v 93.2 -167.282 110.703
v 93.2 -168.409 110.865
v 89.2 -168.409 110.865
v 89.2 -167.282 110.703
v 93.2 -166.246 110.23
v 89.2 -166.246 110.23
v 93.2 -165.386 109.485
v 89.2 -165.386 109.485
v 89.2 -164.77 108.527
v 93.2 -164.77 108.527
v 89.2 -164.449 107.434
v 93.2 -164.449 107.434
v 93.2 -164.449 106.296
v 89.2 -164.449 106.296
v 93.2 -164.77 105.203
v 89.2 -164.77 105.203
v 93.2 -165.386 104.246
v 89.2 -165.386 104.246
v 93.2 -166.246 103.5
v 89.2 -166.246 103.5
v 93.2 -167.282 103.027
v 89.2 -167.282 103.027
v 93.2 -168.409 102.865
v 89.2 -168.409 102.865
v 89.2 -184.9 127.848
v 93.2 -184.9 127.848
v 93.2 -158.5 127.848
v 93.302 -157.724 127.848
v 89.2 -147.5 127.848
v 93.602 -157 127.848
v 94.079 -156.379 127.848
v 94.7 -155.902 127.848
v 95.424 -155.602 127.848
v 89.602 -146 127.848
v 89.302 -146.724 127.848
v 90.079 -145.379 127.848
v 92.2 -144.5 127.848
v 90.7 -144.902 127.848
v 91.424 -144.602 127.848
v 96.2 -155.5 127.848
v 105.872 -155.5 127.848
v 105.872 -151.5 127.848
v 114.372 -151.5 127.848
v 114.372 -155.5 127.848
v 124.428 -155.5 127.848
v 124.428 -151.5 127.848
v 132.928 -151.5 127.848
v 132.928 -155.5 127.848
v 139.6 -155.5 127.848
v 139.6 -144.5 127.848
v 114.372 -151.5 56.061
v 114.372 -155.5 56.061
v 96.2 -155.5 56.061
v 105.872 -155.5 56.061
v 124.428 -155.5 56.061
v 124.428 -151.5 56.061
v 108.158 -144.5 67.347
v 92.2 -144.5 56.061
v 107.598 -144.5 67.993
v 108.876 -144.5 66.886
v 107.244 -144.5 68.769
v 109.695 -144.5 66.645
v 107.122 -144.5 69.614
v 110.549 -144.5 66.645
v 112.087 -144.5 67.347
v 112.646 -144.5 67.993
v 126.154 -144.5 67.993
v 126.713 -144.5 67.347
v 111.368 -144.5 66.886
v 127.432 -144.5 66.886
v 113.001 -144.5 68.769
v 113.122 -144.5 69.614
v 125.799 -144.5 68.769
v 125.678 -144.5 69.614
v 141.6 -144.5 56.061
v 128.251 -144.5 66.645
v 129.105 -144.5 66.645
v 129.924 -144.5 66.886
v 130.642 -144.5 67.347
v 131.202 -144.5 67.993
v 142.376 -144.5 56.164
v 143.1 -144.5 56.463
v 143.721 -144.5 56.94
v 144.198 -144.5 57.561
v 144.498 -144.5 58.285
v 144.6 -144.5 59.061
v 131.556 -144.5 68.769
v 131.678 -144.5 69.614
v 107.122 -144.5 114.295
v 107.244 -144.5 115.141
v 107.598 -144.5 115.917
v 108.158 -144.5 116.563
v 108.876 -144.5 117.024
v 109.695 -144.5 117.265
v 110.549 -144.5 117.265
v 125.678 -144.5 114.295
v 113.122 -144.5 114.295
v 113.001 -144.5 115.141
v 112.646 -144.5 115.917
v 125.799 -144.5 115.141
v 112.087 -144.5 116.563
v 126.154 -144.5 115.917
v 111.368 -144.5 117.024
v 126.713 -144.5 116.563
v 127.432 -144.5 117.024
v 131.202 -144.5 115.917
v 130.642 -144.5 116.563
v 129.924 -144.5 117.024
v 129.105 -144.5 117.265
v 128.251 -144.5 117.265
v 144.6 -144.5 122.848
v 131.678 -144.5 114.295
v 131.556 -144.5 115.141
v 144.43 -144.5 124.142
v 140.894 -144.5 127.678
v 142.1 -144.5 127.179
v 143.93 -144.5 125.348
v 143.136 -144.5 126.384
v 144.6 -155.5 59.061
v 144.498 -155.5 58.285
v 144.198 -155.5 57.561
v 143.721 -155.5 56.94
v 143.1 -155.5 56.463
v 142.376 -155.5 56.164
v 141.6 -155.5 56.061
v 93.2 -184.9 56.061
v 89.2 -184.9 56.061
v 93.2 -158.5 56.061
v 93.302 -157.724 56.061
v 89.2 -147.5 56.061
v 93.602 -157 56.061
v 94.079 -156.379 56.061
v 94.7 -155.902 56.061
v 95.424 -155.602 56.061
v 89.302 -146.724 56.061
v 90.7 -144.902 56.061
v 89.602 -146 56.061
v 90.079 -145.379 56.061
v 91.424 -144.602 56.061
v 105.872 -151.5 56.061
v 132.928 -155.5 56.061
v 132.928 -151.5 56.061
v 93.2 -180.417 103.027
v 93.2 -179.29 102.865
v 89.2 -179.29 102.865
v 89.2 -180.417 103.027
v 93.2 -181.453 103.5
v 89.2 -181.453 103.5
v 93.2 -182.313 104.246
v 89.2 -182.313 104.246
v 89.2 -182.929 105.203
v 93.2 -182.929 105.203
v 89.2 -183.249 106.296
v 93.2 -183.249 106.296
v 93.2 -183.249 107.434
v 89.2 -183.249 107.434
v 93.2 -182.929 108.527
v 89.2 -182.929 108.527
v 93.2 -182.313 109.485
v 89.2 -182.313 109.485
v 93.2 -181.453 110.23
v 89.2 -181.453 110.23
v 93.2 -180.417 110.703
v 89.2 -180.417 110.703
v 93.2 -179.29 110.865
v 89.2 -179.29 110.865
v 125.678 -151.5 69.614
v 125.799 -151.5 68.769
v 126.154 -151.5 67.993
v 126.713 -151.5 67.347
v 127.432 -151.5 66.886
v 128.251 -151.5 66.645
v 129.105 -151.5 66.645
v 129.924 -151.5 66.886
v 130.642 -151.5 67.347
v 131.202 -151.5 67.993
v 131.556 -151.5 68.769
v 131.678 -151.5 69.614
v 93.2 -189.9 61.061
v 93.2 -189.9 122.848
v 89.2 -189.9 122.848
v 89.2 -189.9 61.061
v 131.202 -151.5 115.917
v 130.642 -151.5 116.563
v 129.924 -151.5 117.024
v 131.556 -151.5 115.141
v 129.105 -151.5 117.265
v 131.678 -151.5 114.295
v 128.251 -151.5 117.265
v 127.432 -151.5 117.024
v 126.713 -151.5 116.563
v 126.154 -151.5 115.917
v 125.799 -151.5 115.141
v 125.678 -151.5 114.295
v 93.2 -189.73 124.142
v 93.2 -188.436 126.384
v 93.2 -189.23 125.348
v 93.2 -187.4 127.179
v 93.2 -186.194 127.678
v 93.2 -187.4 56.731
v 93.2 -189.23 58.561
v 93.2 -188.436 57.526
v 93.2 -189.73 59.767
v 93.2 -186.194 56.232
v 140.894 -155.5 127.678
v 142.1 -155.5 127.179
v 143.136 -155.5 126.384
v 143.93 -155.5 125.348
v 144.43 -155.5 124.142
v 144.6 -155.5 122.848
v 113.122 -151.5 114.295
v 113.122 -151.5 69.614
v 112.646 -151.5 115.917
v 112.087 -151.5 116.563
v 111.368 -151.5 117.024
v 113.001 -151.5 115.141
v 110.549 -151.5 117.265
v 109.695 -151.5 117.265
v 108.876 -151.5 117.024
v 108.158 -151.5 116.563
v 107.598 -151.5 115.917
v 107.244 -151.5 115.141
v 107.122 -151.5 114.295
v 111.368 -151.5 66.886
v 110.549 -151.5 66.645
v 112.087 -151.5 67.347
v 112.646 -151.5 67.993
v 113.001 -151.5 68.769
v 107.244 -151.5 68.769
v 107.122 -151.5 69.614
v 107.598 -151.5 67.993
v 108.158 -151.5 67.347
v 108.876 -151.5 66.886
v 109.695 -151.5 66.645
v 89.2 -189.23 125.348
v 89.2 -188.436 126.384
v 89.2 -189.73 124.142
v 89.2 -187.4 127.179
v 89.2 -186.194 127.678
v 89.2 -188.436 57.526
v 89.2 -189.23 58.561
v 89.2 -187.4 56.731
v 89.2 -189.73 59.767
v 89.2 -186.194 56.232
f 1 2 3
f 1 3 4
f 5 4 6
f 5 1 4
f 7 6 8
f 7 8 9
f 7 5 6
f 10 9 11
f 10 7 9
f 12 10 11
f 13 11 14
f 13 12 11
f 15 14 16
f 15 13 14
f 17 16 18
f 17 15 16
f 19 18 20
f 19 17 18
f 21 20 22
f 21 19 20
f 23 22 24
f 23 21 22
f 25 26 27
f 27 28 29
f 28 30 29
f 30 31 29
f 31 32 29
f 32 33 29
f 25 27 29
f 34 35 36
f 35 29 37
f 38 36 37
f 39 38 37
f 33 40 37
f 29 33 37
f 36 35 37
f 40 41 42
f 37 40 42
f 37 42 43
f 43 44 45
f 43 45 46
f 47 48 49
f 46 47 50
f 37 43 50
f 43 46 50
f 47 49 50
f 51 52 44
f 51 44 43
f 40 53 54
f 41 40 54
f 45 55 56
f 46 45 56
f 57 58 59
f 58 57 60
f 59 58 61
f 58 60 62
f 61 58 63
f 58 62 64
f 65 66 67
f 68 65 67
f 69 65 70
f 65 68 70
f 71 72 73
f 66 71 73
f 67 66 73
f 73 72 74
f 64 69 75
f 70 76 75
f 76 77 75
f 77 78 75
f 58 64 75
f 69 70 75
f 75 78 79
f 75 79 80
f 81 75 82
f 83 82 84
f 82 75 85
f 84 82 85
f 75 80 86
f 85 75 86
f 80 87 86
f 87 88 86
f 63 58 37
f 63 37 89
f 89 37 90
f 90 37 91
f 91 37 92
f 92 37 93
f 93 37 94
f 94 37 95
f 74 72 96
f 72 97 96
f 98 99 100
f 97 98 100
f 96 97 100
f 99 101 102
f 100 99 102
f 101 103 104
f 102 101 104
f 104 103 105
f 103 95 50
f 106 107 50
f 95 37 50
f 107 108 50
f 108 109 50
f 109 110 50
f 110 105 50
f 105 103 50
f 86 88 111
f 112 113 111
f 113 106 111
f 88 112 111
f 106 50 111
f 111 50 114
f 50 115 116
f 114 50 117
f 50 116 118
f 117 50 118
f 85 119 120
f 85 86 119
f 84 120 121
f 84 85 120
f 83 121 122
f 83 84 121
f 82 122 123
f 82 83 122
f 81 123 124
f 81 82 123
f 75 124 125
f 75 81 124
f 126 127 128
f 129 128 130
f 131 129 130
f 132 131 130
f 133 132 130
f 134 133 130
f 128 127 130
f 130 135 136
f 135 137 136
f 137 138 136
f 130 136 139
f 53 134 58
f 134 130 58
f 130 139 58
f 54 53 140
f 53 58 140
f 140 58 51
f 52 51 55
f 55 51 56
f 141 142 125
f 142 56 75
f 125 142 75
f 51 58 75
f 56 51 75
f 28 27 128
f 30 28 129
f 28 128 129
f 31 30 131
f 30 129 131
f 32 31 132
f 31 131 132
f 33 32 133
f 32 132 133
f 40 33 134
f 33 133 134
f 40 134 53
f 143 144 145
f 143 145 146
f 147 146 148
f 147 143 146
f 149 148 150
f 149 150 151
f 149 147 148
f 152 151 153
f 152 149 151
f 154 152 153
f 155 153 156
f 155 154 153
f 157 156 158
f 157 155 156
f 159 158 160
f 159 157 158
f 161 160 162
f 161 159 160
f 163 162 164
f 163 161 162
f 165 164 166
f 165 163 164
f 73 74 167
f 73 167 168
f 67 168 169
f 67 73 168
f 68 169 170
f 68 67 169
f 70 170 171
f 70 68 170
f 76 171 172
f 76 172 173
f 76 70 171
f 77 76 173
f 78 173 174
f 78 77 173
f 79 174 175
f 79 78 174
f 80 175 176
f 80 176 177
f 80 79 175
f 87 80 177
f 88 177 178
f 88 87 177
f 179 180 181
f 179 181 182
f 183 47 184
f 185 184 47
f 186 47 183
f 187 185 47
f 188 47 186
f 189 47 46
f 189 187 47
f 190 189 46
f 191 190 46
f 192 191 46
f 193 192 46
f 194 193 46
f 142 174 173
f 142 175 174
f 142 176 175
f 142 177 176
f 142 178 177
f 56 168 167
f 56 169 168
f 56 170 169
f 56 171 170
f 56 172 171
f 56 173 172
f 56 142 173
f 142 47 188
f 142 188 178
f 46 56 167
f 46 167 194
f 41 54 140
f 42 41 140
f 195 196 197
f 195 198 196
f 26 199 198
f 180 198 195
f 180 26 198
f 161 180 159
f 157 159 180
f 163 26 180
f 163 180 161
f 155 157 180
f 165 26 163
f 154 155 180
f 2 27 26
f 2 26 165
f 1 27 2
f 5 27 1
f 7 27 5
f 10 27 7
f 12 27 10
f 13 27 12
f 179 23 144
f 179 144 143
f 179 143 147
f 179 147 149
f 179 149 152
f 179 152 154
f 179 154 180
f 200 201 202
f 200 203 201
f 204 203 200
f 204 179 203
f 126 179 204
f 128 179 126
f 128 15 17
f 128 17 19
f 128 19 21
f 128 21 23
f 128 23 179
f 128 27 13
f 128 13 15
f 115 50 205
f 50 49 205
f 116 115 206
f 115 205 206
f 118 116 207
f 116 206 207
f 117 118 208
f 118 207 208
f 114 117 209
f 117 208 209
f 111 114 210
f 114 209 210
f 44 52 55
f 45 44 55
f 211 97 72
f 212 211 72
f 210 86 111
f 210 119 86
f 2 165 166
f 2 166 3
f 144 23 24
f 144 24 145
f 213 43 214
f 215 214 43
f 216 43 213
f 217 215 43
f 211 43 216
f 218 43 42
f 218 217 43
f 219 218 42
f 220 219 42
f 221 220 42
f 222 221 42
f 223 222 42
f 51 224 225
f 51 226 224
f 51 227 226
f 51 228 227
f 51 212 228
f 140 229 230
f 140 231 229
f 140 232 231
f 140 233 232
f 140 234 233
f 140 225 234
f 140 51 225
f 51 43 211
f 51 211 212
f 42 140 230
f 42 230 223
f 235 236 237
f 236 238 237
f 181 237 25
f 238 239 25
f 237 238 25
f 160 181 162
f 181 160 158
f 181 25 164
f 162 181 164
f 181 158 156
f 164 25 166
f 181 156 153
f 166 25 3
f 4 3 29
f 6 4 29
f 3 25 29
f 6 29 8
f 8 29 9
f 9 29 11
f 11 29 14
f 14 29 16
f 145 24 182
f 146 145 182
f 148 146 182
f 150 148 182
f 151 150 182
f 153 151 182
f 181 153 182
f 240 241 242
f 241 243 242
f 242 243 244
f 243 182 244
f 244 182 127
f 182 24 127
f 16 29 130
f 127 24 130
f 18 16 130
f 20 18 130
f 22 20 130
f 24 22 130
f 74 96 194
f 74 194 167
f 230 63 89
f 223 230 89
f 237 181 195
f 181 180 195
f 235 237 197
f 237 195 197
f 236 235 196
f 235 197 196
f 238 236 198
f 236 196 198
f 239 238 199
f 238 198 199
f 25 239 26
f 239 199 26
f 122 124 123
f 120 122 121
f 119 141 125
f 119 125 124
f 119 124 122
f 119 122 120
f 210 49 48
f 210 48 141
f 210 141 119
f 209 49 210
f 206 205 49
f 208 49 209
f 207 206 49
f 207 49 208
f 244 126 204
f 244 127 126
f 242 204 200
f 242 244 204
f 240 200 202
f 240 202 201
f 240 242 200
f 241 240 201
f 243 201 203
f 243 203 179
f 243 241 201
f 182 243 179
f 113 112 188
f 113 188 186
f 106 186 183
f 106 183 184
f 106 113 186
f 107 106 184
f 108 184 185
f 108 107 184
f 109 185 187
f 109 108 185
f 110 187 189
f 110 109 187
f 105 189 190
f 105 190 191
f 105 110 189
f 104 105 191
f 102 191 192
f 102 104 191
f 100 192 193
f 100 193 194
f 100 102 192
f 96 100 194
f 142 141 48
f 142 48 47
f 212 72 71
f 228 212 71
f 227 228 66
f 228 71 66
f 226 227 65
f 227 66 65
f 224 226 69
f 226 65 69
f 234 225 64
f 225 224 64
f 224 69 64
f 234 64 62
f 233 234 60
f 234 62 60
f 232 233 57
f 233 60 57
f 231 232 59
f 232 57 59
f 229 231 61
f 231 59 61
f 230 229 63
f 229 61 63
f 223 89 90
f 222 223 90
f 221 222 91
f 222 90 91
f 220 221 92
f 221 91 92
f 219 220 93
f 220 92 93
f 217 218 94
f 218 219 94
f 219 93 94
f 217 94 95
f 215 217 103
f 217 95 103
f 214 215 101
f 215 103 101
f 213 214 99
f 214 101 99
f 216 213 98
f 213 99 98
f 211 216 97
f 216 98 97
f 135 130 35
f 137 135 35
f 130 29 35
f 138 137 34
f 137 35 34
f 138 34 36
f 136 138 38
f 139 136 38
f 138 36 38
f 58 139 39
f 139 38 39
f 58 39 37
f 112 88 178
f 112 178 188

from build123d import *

# Parameters (mm, degrees)
BOSS_EXTRUDE1_START             = 0.2
SKETCH2_W                       = 41.966567091
SKETCH2_H                       = 11
SKETCH2_H_2                     = 34.4
SKETCH2_R                       = 4
SKETCH2_H_3                     = 4
BOSS_EXTRUDE1_DEPTH             = 4
BOSS_EXTRUDE2_REACH             = 197.713
SKETCH2_3_W                     = 41.966567091
SKETCH2_3_H                     = 11
SKETCH2_3_H_2                   = 4
BOSS_EXTRUDE2_DIRECTION_2_DEPTH = 60.2
FILLET1_R                       = 3
SKETCH3_W                       = 9
SKETCH3_H                       = 11.2
CUT_EXTRUDE1_DEPTH              = 24.029037182
SKETCH4_W                       = 71.659193782
SKETCH4_H                       = 19.690367256
SKETCH4_R                       = 3.18615952
BOSS_EXTRUDE3_DEPTH             = 4
FILLET2_R                       = 3
BOSS_EXTRUDE4_START             = -11
SKETCH5_W                       = 55.4
SKETCH5_H                       = 29.820392461
BOSS_EXTRUDE4_DEPTH             = 11
FILLET3_R                       = 3
CUT_EXTRUDE2_DEPTH              = 258.572392856
CUT_EXTRUDE2_DEPTH_BACK         = 258.572392856
SKETCH7_W                       = 8.5
SKETCH7_H                       = 4
FILLET6_R                       = 2
CUT_EXTRUDE3_REACH              = 172.81
CUT_EXTRUDE4_DEPTH              = 174.523300181
CUT_EXTRUDE4_DEPTH_BACK         = 174.523300181
FILLET7_R                       = 5
BOSS_EXTRUDE5_START             = -4
SKETCH10_W                      = 29.820392461
SKETCH10_H                      = 34.4
BOSS_EXTRUDE5_DEPTH             = 4
BOSS_EXTRUDE6_START             = 29.82039246
BOSS_EXTRUDE6_DEPTH             = 29.82039246
CUT_EXTRUDE5_DEPTH              = 210.306605099
CUT_EXTRUDE5_DEPTH_BACK         = 210.306605099
CUT_EXTRUDE6_DEPTH              = 210.306605099
CUT_EXTRUDE6_DEPTH_BACK         = 210.306605099
SKETCH15_W                      = 78.727492145
SKETCH15_H                      = 13.85710387
CUT_EXTRUDE8_REACH              = 163.596
SKETCH16_W                      = 13.433327452
SKETCH16_H                      = 52.832089958
FILLET8_R                       = 5


with BuildPart() as part:
    # Sketch2 → Boss-Extrude1 (new body)
    # profile 1 of 3: a face of its own
    with BuildSketch(Plane.ZY.offset(-93.4).offset(BOSS_EXTRUDE1_START)):
        with Locations((5.257762951, -150)):
            Rectangle(SKETCH2_W, SKETCH2_H)
    # profile 2 of 3: a face of its own
    with BuildSketch(Plane.ZY.offset(-93.4).offset(BOSS_EXTRUDE1_START)):
        with Locations((5.257762951, -172.7)):
            Rectangle(SKETCH2_W, SKETCH2_H_2)
        with Locations((5.257762951, -173.849326746)):
            Circle(SKETCH2_R, mode=Mode.SUBTRACT)
    # profile 3 of 3: a face of its own
    with BuildSketch(Plane.ZY.offset(-93.4).offset(BOSS_EXTRUDE1_START)):
        with Locations((5.257762951, -191.9)):
            Rectangle(SKETCH2_W, SKETCH2_H_3)
    extrude(amount=BOSS_EXTRUDE1_DEPTH)

    # Sketch2<3> → Boss-Extrude2 (add, up to next)
    with BuildSketch(Plane.ZY.offset(-93.4), mode=Mode.PRIVATE) as boss_extrude2_sk1:
        with Locations((5.257762951, -150)):
            Rectangle(SKETCH2_3_W, SKETCH2_3_H)
    boss_extrude2_tool1 = extrude(boss_extrude2_sk1.sketch, amount=BOSS_EXTRUDE2_REACH, mode=Mode.PRIVATE) - part.part
    # Sketch2<3> → Boss-Extrude2 (add, up to next)
    with BuildSketch(Plane.ZY.offset(-93.4), mode=Mode.PRIVATE) as boss_extrude2_sk2:
        with Locations((5.257762951, -191.9)):
            Rectangle(SKETCH2_3_W, SKETCH2_3_H_2)
    boss_extrude2_tool2 = extrude(boss_extrude2_sk2.sketch, amount=BOSS_EXTRUDE2_REACH, mode=Mode.PRIVATE) - part.part
    add(boss_extrude2_tool1.solids().sort_by_distance((93.4, -150, 5.257763))[0])
    add(boss_extrude2_tool2.solids().sort_by_distance((93.4, -191.9, 5.257763))[0])

    # Sketch2<3> → Boss-Extrude2 direction 2 (add)
    with BuildSketch(Plane.ZY.offset(-93.4)):
        with Locations((5.257762951, -150)):
            Rectangle(SKETCH2_3_W, SKETCH2_3_H)
        with Locations((5.257762951, -191.9)):
            Rectangle(SKETCH2_3_W, SKETCH2_3_H_2)
    extrude(amount=-BOSS_EXTRUDE2_DIRECTION_2_DEPTH)

    # Fillet1
    fillet1_edges = [part.edges().sort_by_distance(p)[0] for p in [
        (89.2, -193.9, 5.257762951),
        (93.2, -155.5, 5.257762951),
        (153.6, -191.9, 26.241046496),
        (93.2, -189.9, 5.257762951),
        (153.6, -191.9, -15.725520595),
    ]]
    fillet(fillet1_edges, radius=FILLET1_R)

    # Sketch3 → Cut-Extrude1 (cut)
    with BuildSketch(Plane.XY.offset(26.241046496)):
        with Locations((149.1, -150.1)):
            Rectangle(SKETCH3_W, SKETCH3_H)
    extrude(amount=-CUT_EXTRUDE1_DEPTH, mode=Mode.SUBTRACT)

    # Sketch4 → Boss-Extrude3 (add)
    with BuildSketch(Plane(origin=(153.6, 0, 0), x_dir=(0, 0, -1), z_dir=(1, 0, 0))):
        with Locations((-20.104076296, -145.654816372)):
            Rectangle(SKETCH4_W, SKETCH4_H)
        with Locations((-39.297424086, -145.700936153)):
            Circle(SKETCH4_R, mode=Mode.SUBTRACT)
        with Locations((-9.68615952, -145.700936153)):
            Circle(SKETCH4_R, mode=Mode.SUBTRACT)
    extrude(amount=-BOSS_EXTRUDE3_DEPTH)

    # Fillet2
    fillet2_edges = [part.edges().sort_by_distance(p)[0] for p in [
        (149.6, -144.5, -6.75675564),
        (151.6, -135.809632744, -15.725520595),
        (151.6, -135.809632744, 55.933673187),
    ]]
    fillet(fillet2_edges, radius=FILLET2_R)

    # Sketch5 → Boss-Extrude4 (add)
    with BuildSketch(Plane(origin=(0, -144.5, 0), x_dir=(1, 0, 0), z_dir=(0, 1, 0)).offset(BOSS_EXTRUDE4_START)):
        with Locations((116.9, -41.151242727)):
            Rectangle(SKETCH5_W, SKETCH5_H)
    extrude(amount=BOSS_EXTRUDE4_DEPTH)

    # Fillet3
    fillet3_edges = [part.edges().sort_by_distance(p)[0] for p in [
        (144.6, -150, 56.061438957),
        (89.2, -144.5, 20.167959181),
    ]]
    fillet(fillet3_edges, radius=FILLET3_R)

    # Sketch7 → Cut-Extrude2 (cut, two sides: drawn at the far end of the back side and taken through both)
    with BuildSketch(Plane(origin=(0, 0, -15.725520595), x_dir=(-1, 0, 0), z_dir=(0, 0, -1)).offset(-CUT_EXTRUDE2_DEPTH_BACK)):
        with Locations((-128.677790471, -153.5)):
            Rectangle(SKETCH7_W, SKETCH7_H)
        with Locations((-110.122209529, -153.5)):
            Rectangle(SKETCH7_W, SKETCH7_H)
    extrude(amount=CUT_EXTRUDE2_DEPTH + CUT_EXTRUDE2_DEPTH_BACK, mode=Mode.SUBTRACT)

    # Fillet6
    fillet6_edges = [part.edges().sort_by_distance(p)[0] for p in [
        (144.6, -150, 2.212009314),
    ]]
    fillet(fillet6_edges, radius=FILLET6_R)

    # Sketch8 → Cut-Extrude3 (cut, up to next)
    with BuildSketch(Plane(origin=(0, -144.5, 0), x_dir=(1, 0, 0), z_dir=(0, 1, 0)), mode=Mode.PRIVATE) as cut_extrude3_sk1:
        with BuildLine():
            Line((113.122209529, 2.172515143), (113.122209529, -42.508433505))
            ThreePointArc((113.122209529, -42.508433505), (110.122209529, -45.508433505), (107.122209529, -42.508433505))
            Line((107.122209529, -42.508433505), (107.122209529, 2.172515143))
            ThreePointArc((107.122209529, 2.172515143), (110.122209529, 5.172515143), (113.122209529, 2.172515143))
        make_face()
    cut_extrude3_tool1 = extrude(cut_extrude3_sk1.sketch, amount=-CUT_EXTRUDE3_REACH, mode=Mode.PRIVATE) & part.part
    # Sketch8 → Cut-Extrude3 (cut, up to next)
    with BuildSketch(Plane(origin=(0, -144.5, 0), x_dir=(1, 0, 0), z_dir=(0, 1, 0)), mode=Mode.PRIVATE) as cut_extrude3_sk2:
        with BuildLine():
            Line((125.677790471, 2.172515143), (125.677790471, -42.508433505))
            ThreePointArc((125.677790471, -42.508433505), (128.677790471, -45.508433505), (131.677790471, -42.508433505))
            Line((131.677790471, -42.508433505), (131.677790471, 2.172515143))
            ThreePointArc((131.677790471, 2.172515143), (128.677790471, 5.172515143), (125.677790471, 2.172515143))
        make_face()
    cut_extrude3_tool2 = extrude(cut_extrude3_sk2.sketch, amount=-CUT_EXTRUDE3_REACH, mode=Mode.PRIVATE) & part.part
    add(cut_extrude3_tool1.solids().sort_by_distance((110.12221, -144.5, 20.167959))[0], mode=Mode.SUBTRACT)
    add(cut_extrude3_tool2.solids().sort_by_distance((128.67779, -144.5, 20.167959))[0], mode=Mode.SUBTRACT)

    # Sketch9 → Cut-Extrude4 (cut, two sides: drawn at the far end of the back side and taken through both)
    with BuildSketch(Plane(origin=(0, -135.809632744, 0), x_dir=(1, 0, 0), z_dir=(0, 1, 0)).offset(-CUT_EXTRUDE4_DEPTH_BACK)):
        Polygon((144.6, 47.11572478), (144.6, -77.58184164), (185.54461202, -56.674351197), (190.182137353, 46.607841752), align=None)
    extrude(amount=CUT_EXTRUDE4_DEPTH + CUT_EXTRUDE4_DEPTH_BACK, mode=Mode.SUBTRACT)

    # Fillet7
    fillet7_edges = [part.edges().sort_by_distance(p)[0] for p in [
        (144.6, -150, -15.725520595),
    ]]
    fillet(fillet7_edges, radius=FILLET7_R)

    # Sketch10 → Boss-Extrude5 (add)
    with BuildSketch(Plane.ZY.offset(-89.2).offset(BOSS_EXTRUDE5_START)):
        with Locations((41.151242727, -172.7)):
            Rectangle(SKETCH10_W, SKETCH10_H)
    extrude(amount=BOSS_EXTRUDE5_DEPTH)

    # Sketch11 → Boss-Extrude6 (add)
    with BuildSketch(Plane.XY.offset(26.241046496).offset(BOSS_EXTRUDE6_START)):
        with BuildLine():
            Line((93.2, -155.5), (93.2, -158.5))
            ThreePointArc((93.2, -158.5), (94.078679656, -156.378679656), (96.2, -155.5))
            Line((96.2, -155.5), (93.2, -155.5))
        make_face()
    extrude(amount=-BOSS_EXTRUDE6_DEPTH)

    # Sketch14 → Cut-Extrude5 (cut, two sides: drawn at the far end of the back side and taken through both)
    with BuildSketch(Plane.ZY.offset(-89.2).offset(-CUT_EXTRUDE5_DEPTH_BACK)):
        with BuildLine():
            Line((9.257762951, -168.408548592), (9.257762951, -179.290104899))
            ThreePointArc((9.257762951, -179.290104899), (5.257762951, -183.290104899), (1.257762951, -179.290104899))
            Line((1.257762951, -179.290104899), (1.257762951, -168.408548592))
            ThreePointArc((1.257762951, -168.408548592), (5.257762951, -164.408548592), (9.257762951, -168.408548592))
        make_face()
    extrude(amount=CUT_EXTRUDE5_DEPTH + CUT_EXTRUDE5_DEPTH_BACK, mode=Mode.SUBTRACT)

    # Sketch15 → Cut-Extrude6 (cut, two sides: drawn at the far end of the back side and taken through both)
    with BuildSketch(Plane.ZY.offset(-89.2).offset(-CUT_EXTRUDE6_DEPTH_BACK)):
        with Locations((22.135388596, -196.828551935)):
            Rectangle(SKETCH15_W, SKETCH15_H)
    extrude(amount=CUT_EXTRUDE6_DEPTH + CUT_EXTRUDE6_DEPTH_BACK, mode=Mode.SUBTRACT)

    # Sketch16 → Cut-Extrude8 (cut, up to next)
    with BuildSketch(Plane.XZ.offset(189.9), mode=Mode.PRIVATE) as cut_extrude8_sk1:
        with Locations((99.916663726, 10.690524384)):
            Rectangle(SKETCH16_W, SKETCH16_H)
    cut_extrude8_tool1 = extrude(cut_extrude8_sk1.sketch, amount=-CUT_EXTRUDE8_REACH, mode=Mode.PRIVATE) & part.part
    add(cut_extrude8_tool1.solids().sort_by_distance((99.916664, -189.9, 10.690524))[0], mode=Mode.SUBTRACT)

    # Fillet8
    fillet8_edges = [part.edges().sort_by_distance(p)[0] for p in [
        (91.2, -189.9, 56.061438957),
        (91.2, -189.9, -15.725520595),
    ]]
    fillet(fillet8_edges, radius=FILLET8_R)


with BuildPart() as body_2:
    # Mirror1: mirrored copy
    add(part.part.mirror(Plane(origin=(144.6, -155.5, 56.061438957), x_dir=(1, 0, 0), z_dir=(0, 0, 1))))


solid = body_2.part
